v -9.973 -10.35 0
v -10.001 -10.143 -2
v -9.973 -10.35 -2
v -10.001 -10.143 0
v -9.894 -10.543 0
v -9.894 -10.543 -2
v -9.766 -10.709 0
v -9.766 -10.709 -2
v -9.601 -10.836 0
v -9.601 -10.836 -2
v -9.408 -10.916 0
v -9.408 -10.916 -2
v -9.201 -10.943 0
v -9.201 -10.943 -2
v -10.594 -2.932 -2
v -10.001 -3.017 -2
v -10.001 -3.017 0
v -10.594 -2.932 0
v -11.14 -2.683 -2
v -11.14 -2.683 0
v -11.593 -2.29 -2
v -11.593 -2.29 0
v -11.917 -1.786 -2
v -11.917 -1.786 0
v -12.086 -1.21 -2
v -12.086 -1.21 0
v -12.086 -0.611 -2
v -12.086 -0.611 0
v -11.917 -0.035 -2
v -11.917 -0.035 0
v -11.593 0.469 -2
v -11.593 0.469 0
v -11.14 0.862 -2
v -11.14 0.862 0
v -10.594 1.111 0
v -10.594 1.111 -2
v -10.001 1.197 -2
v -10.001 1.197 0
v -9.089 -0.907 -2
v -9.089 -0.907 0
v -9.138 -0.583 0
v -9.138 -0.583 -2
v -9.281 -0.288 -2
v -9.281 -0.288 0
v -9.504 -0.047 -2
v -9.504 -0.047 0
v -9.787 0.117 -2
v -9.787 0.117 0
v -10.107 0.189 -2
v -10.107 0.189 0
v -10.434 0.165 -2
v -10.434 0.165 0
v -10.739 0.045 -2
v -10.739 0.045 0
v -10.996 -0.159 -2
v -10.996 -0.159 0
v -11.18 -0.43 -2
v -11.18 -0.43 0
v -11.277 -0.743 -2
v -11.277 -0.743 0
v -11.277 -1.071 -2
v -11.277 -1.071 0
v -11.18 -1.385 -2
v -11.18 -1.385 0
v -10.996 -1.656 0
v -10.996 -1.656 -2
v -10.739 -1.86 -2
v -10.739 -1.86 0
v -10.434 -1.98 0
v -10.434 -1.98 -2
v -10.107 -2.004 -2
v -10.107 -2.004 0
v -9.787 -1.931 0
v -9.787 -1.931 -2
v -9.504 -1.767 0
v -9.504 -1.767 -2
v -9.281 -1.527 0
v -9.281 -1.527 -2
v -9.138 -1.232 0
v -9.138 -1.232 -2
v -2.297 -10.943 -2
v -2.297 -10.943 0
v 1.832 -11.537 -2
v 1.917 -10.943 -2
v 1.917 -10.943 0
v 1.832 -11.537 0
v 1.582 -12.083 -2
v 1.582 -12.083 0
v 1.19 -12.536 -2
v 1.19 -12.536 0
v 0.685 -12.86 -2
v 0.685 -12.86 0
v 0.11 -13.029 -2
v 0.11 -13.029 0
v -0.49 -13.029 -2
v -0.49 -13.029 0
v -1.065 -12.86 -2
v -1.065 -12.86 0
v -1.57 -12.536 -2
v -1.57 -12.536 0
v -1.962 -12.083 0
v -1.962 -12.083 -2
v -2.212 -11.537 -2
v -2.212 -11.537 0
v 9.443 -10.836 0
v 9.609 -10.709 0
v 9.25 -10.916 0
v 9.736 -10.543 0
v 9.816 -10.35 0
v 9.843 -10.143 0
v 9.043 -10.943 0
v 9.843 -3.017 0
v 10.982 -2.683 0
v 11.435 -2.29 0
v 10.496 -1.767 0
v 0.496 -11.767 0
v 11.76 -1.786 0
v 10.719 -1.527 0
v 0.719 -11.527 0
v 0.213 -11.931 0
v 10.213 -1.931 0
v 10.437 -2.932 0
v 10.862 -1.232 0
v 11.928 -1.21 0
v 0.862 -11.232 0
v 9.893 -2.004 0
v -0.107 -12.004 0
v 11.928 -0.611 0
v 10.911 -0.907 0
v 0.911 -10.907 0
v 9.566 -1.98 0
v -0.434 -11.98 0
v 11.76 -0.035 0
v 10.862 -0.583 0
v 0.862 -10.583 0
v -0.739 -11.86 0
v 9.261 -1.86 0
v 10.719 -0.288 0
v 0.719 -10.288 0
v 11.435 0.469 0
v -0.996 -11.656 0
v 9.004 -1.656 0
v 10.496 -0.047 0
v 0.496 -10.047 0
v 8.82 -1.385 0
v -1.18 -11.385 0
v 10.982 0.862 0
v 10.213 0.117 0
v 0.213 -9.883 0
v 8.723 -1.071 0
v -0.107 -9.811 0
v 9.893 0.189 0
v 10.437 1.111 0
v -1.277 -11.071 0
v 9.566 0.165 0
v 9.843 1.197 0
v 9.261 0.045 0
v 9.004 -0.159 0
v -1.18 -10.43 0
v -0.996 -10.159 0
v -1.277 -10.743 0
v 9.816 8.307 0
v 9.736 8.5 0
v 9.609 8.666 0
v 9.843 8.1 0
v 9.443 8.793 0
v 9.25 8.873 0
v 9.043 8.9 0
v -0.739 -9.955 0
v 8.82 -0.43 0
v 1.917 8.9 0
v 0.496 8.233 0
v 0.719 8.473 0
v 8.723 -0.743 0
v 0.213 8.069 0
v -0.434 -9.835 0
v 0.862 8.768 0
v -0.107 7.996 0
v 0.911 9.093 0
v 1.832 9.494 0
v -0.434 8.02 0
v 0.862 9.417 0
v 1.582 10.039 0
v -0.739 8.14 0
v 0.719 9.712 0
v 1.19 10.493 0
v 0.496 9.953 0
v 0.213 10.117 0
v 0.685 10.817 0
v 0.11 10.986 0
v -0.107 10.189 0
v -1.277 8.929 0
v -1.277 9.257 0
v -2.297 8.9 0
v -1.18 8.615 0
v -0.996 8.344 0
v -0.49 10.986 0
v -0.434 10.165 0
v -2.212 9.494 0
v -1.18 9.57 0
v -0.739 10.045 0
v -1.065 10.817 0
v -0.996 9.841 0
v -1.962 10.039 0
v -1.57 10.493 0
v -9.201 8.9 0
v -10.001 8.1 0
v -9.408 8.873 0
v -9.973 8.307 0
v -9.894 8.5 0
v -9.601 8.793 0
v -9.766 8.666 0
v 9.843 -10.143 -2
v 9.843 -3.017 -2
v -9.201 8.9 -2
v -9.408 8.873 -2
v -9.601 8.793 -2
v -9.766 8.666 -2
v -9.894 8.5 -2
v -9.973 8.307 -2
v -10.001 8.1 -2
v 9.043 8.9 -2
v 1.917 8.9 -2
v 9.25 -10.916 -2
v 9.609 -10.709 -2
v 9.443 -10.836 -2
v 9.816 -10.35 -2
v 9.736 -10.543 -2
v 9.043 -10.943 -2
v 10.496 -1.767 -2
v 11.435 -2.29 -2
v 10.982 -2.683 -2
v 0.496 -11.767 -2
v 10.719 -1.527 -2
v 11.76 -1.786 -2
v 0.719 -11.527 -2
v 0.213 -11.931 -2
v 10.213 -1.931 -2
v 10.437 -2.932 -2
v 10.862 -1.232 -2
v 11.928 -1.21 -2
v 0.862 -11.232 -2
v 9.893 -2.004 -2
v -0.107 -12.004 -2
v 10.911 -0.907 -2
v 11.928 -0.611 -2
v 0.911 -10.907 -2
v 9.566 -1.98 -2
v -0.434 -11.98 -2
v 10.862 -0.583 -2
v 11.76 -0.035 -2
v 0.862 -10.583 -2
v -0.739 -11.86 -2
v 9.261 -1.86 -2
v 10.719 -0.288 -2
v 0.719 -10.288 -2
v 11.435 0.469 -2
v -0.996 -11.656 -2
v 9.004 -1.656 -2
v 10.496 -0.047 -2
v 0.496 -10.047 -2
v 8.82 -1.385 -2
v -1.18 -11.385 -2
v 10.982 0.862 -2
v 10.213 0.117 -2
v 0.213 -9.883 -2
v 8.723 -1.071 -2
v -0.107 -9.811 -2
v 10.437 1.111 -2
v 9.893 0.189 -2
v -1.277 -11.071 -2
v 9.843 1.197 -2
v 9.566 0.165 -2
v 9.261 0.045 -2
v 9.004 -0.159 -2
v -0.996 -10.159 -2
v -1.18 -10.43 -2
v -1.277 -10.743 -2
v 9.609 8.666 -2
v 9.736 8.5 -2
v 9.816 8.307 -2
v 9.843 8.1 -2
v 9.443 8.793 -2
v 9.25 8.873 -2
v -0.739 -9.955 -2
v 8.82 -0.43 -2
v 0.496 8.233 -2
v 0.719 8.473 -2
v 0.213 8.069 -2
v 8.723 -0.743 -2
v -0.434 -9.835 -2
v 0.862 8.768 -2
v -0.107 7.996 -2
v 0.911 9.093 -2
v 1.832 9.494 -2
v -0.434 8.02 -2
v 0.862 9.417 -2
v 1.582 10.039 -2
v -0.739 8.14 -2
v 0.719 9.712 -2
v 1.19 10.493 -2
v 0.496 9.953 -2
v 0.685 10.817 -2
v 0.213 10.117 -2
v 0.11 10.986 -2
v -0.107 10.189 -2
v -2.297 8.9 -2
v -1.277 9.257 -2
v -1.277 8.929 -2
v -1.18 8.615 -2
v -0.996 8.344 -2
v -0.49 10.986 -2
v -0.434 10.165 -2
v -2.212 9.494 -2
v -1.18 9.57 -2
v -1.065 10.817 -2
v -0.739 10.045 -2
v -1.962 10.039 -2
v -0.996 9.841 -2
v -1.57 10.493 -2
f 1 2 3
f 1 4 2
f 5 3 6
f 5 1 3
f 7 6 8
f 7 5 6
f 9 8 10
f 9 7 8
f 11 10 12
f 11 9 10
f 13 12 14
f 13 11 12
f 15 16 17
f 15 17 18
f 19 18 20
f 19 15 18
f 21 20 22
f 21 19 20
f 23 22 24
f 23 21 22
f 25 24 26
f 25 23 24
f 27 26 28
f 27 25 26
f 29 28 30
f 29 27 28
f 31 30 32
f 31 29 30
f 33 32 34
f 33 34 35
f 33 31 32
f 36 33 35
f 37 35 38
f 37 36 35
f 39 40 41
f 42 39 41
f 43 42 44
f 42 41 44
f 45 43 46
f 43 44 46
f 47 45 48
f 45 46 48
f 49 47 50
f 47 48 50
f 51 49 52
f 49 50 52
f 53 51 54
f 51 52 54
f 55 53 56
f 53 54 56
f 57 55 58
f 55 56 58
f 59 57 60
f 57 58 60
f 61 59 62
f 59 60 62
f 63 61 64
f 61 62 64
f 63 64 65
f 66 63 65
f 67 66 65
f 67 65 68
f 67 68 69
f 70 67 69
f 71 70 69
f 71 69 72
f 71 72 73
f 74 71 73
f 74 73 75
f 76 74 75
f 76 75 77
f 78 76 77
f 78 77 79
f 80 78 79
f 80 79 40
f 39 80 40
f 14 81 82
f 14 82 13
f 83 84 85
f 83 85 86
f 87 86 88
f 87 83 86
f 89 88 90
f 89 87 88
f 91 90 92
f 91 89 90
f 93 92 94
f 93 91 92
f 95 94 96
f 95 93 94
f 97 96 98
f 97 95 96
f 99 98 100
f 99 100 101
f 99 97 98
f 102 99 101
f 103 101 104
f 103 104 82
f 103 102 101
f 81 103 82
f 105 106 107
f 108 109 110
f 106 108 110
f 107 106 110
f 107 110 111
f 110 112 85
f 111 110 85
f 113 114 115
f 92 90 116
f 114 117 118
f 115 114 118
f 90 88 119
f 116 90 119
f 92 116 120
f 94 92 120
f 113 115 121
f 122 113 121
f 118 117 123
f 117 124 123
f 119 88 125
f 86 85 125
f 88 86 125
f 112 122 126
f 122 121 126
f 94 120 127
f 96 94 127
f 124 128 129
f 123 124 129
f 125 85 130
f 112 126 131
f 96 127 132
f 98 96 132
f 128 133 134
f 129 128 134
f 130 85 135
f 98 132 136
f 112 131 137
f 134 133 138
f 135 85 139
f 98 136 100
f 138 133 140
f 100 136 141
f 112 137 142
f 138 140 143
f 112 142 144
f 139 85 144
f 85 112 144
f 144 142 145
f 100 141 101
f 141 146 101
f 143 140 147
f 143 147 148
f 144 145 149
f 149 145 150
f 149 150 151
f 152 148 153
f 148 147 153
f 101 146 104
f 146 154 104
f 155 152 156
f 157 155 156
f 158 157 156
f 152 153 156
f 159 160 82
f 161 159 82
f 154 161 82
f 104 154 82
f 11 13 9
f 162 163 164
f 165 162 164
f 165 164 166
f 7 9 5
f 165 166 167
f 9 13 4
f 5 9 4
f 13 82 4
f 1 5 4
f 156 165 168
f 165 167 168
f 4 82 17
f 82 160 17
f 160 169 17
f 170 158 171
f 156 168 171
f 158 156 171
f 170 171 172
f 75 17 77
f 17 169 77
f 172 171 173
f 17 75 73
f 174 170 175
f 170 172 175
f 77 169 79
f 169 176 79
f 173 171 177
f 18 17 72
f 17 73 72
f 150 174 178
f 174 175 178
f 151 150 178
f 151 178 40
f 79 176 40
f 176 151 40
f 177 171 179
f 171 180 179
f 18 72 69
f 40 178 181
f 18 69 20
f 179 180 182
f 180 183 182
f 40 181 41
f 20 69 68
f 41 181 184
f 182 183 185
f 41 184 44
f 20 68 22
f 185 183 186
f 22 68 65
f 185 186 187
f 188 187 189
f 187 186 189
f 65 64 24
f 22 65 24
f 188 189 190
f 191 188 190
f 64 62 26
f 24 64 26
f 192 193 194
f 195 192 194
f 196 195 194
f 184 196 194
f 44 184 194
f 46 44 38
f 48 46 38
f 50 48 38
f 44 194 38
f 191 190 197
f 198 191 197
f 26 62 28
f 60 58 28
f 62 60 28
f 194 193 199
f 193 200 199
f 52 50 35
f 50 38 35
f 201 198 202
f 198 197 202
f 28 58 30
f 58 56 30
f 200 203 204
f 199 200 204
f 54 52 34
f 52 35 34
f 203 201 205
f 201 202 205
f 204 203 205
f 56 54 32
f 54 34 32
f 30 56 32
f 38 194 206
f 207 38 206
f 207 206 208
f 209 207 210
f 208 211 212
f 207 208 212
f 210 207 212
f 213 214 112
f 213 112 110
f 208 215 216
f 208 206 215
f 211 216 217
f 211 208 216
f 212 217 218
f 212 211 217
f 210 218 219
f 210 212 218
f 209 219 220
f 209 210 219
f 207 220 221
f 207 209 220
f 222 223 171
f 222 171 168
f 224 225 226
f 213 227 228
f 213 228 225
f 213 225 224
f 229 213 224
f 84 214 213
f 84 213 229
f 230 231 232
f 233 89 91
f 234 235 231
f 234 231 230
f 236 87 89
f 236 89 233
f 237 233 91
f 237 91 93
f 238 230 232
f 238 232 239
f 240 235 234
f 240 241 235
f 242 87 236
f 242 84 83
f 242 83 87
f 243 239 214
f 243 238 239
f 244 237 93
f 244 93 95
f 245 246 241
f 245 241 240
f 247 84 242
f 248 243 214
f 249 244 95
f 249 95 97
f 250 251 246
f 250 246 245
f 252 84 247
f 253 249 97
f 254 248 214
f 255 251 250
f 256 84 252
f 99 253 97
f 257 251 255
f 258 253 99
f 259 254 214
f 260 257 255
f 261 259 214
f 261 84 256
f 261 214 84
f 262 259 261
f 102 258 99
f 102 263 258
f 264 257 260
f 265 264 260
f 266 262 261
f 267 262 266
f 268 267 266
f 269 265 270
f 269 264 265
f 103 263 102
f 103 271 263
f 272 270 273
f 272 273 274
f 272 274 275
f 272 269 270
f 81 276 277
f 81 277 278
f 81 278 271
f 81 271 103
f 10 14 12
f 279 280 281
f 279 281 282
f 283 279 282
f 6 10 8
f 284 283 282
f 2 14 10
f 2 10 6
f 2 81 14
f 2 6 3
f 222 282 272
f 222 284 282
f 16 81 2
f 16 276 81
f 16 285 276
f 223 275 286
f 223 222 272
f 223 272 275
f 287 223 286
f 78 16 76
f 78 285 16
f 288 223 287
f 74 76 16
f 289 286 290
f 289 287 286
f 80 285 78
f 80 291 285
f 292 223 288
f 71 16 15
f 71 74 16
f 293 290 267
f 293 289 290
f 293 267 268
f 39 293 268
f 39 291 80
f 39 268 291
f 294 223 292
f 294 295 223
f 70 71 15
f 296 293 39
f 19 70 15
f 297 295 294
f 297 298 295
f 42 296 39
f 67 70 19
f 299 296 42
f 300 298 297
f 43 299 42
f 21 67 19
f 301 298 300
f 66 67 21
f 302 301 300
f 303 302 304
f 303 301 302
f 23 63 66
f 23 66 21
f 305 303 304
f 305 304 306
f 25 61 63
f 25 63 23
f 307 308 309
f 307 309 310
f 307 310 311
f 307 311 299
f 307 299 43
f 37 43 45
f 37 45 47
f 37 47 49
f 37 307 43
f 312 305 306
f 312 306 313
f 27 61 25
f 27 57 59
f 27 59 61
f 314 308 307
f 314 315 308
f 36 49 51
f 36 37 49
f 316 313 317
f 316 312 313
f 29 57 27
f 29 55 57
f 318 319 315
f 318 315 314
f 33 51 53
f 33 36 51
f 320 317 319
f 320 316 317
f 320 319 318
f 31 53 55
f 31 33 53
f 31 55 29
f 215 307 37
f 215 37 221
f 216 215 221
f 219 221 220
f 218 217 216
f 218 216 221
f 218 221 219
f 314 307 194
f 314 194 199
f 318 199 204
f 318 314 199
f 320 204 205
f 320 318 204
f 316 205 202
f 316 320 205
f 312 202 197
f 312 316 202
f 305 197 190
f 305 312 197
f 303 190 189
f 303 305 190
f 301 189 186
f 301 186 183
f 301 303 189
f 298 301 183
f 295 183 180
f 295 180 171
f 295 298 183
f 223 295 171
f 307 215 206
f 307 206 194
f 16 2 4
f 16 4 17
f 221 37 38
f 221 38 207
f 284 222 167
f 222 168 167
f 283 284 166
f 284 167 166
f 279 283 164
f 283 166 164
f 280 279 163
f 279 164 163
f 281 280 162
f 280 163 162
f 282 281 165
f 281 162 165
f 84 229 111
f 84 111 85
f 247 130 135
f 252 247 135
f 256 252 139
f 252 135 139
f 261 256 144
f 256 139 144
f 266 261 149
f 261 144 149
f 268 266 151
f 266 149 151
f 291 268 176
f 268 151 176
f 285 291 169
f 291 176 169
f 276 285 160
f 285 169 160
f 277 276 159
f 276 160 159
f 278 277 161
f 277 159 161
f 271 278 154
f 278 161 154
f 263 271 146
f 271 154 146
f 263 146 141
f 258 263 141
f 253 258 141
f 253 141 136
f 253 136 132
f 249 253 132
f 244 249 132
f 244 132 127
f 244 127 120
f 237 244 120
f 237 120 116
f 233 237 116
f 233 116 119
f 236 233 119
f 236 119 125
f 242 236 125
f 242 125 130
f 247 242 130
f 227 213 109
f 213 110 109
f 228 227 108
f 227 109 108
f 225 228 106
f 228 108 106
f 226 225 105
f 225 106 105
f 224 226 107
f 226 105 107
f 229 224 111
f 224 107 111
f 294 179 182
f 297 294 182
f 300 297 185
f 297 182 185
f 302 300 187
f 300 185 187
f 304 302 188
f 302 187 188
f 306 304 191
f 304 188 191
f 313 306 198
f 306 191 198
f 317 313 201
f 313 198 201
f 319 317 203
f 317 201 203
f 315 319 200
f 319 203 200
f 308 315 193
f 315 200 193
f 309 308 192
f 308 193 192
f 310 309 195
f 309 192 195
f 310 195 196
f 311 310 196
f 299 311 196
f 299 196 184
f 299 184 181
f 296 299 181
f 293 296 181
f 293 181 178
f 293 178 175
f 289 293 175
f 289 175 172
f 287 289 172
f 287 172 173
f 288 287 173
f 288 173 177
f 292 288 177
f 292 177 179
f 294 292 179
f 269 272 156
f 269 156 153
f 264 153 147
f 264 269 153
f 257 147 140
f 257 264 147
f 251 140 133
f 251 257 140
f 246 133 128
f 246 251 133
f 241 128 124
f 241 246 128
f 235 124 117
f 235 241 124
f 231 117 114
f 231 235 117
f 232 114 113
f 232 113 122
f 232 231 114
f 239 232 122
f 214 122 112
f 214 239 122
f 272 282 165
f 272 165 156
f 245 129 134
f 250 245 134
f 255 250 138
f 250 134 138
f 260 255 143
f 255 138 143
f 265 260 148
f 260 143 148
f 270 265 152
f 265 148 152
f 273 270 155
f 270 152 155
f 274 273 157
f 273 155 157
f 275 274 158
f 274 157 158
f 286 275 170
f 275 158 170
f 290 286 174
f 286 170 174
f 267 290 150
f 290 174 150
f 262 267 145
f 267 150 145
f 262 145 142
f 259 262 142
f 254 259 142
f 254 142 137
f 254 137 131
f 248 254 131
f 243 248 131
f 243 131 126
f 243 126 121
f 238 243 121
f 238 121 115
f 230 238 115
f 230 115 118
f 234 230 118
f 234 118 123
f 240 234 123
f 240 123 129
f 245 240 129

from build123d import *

# Parameters (mm, degrees)
BOSS_EXTRUDE1_DEPTH   = 2
F_1_CLEARANCE_HOLE1_D = 2.20000068
FILLET1_R             = 0.8


with BuildPart() as part:
    # Sketch1 → Boss-Extrude1 (new body)
    with BuildSketch(Plane(origin=(0, 0, -2), x_dir=(-1, 0, 0), z_dir=(0, 0, -1))):
        with BuildLine():
            Line((-1.91693771, 8.900326187), (-9.84300771, 8.900326187))
            Line((-9.84300771, 8.900326187), (-9.84300771, 1.196506187))
            ThreePointArc((-9.84300771, 1.196506187), (-11.94993771, -0.910423813), (-9.84300771, -3.017353813))
            Line((-9.84300771, -3.017353813), (-9.84300771, -10.943423813))
            Line((-9.84300771, -10.943423813), (-1.91693771, -10.943423813))
            ThreePointArc((-1.91693771, -10.943423813), (0.18999229, -13.050353813), (2.29692229, -10.943423813))
            Line((2.29692229, -10.943423813), (10.00074229, -10.943423813))
            Line((10.00074229, -10.943423813), (10.00074229, -3.017353813))
            ThreePointArc((10.00074229, -3.017353813), (12.10767229, -0.910423813), (10.00074229, 1.196506187))
            Line((10.00074229, 1.196506187), (10.00074229, 8.900326187))
            Line((10.00074229, 8.900326187), (2.29692229, 8.900326187))
            ThreePointArc((2.29692229, 8.900326187), (0.18999229, 11.007256187), (-1.91693771, 8.900326187))
        make_face()
    extrude(amount=-BOSS_EXTRUDE1_DEPTH)

    # #1 Clearance Hole1 (through all)
    with Locations(Plane(origin=(0, 0, -2), x_dir=(-1, 0, 0), z_dir=(0, 0, -1))):
        with Locations((0.189367378, -10.907429297), (0.189367378, 9.092570703), (10.189367378, -0.907429297), (-9.810632622, -0.907429297)):
            Hole(F_1_CLEARANCE_HOLE1_D / 2)

    # Fillet1
    fillet1_edges = [part.edges().sort_by_distance(p)[0] for p in [
        (-10.00074229, 8.900326187, -1),
        (-10.00074229, -10.943423813, -1),
        (9.84300771, -10.943423813, -1),
        (9.84300771, 8.900326187, -1),
    ]]
    fillet(fillet1_edges, radius=FILLET1_R)


solid = part.part
